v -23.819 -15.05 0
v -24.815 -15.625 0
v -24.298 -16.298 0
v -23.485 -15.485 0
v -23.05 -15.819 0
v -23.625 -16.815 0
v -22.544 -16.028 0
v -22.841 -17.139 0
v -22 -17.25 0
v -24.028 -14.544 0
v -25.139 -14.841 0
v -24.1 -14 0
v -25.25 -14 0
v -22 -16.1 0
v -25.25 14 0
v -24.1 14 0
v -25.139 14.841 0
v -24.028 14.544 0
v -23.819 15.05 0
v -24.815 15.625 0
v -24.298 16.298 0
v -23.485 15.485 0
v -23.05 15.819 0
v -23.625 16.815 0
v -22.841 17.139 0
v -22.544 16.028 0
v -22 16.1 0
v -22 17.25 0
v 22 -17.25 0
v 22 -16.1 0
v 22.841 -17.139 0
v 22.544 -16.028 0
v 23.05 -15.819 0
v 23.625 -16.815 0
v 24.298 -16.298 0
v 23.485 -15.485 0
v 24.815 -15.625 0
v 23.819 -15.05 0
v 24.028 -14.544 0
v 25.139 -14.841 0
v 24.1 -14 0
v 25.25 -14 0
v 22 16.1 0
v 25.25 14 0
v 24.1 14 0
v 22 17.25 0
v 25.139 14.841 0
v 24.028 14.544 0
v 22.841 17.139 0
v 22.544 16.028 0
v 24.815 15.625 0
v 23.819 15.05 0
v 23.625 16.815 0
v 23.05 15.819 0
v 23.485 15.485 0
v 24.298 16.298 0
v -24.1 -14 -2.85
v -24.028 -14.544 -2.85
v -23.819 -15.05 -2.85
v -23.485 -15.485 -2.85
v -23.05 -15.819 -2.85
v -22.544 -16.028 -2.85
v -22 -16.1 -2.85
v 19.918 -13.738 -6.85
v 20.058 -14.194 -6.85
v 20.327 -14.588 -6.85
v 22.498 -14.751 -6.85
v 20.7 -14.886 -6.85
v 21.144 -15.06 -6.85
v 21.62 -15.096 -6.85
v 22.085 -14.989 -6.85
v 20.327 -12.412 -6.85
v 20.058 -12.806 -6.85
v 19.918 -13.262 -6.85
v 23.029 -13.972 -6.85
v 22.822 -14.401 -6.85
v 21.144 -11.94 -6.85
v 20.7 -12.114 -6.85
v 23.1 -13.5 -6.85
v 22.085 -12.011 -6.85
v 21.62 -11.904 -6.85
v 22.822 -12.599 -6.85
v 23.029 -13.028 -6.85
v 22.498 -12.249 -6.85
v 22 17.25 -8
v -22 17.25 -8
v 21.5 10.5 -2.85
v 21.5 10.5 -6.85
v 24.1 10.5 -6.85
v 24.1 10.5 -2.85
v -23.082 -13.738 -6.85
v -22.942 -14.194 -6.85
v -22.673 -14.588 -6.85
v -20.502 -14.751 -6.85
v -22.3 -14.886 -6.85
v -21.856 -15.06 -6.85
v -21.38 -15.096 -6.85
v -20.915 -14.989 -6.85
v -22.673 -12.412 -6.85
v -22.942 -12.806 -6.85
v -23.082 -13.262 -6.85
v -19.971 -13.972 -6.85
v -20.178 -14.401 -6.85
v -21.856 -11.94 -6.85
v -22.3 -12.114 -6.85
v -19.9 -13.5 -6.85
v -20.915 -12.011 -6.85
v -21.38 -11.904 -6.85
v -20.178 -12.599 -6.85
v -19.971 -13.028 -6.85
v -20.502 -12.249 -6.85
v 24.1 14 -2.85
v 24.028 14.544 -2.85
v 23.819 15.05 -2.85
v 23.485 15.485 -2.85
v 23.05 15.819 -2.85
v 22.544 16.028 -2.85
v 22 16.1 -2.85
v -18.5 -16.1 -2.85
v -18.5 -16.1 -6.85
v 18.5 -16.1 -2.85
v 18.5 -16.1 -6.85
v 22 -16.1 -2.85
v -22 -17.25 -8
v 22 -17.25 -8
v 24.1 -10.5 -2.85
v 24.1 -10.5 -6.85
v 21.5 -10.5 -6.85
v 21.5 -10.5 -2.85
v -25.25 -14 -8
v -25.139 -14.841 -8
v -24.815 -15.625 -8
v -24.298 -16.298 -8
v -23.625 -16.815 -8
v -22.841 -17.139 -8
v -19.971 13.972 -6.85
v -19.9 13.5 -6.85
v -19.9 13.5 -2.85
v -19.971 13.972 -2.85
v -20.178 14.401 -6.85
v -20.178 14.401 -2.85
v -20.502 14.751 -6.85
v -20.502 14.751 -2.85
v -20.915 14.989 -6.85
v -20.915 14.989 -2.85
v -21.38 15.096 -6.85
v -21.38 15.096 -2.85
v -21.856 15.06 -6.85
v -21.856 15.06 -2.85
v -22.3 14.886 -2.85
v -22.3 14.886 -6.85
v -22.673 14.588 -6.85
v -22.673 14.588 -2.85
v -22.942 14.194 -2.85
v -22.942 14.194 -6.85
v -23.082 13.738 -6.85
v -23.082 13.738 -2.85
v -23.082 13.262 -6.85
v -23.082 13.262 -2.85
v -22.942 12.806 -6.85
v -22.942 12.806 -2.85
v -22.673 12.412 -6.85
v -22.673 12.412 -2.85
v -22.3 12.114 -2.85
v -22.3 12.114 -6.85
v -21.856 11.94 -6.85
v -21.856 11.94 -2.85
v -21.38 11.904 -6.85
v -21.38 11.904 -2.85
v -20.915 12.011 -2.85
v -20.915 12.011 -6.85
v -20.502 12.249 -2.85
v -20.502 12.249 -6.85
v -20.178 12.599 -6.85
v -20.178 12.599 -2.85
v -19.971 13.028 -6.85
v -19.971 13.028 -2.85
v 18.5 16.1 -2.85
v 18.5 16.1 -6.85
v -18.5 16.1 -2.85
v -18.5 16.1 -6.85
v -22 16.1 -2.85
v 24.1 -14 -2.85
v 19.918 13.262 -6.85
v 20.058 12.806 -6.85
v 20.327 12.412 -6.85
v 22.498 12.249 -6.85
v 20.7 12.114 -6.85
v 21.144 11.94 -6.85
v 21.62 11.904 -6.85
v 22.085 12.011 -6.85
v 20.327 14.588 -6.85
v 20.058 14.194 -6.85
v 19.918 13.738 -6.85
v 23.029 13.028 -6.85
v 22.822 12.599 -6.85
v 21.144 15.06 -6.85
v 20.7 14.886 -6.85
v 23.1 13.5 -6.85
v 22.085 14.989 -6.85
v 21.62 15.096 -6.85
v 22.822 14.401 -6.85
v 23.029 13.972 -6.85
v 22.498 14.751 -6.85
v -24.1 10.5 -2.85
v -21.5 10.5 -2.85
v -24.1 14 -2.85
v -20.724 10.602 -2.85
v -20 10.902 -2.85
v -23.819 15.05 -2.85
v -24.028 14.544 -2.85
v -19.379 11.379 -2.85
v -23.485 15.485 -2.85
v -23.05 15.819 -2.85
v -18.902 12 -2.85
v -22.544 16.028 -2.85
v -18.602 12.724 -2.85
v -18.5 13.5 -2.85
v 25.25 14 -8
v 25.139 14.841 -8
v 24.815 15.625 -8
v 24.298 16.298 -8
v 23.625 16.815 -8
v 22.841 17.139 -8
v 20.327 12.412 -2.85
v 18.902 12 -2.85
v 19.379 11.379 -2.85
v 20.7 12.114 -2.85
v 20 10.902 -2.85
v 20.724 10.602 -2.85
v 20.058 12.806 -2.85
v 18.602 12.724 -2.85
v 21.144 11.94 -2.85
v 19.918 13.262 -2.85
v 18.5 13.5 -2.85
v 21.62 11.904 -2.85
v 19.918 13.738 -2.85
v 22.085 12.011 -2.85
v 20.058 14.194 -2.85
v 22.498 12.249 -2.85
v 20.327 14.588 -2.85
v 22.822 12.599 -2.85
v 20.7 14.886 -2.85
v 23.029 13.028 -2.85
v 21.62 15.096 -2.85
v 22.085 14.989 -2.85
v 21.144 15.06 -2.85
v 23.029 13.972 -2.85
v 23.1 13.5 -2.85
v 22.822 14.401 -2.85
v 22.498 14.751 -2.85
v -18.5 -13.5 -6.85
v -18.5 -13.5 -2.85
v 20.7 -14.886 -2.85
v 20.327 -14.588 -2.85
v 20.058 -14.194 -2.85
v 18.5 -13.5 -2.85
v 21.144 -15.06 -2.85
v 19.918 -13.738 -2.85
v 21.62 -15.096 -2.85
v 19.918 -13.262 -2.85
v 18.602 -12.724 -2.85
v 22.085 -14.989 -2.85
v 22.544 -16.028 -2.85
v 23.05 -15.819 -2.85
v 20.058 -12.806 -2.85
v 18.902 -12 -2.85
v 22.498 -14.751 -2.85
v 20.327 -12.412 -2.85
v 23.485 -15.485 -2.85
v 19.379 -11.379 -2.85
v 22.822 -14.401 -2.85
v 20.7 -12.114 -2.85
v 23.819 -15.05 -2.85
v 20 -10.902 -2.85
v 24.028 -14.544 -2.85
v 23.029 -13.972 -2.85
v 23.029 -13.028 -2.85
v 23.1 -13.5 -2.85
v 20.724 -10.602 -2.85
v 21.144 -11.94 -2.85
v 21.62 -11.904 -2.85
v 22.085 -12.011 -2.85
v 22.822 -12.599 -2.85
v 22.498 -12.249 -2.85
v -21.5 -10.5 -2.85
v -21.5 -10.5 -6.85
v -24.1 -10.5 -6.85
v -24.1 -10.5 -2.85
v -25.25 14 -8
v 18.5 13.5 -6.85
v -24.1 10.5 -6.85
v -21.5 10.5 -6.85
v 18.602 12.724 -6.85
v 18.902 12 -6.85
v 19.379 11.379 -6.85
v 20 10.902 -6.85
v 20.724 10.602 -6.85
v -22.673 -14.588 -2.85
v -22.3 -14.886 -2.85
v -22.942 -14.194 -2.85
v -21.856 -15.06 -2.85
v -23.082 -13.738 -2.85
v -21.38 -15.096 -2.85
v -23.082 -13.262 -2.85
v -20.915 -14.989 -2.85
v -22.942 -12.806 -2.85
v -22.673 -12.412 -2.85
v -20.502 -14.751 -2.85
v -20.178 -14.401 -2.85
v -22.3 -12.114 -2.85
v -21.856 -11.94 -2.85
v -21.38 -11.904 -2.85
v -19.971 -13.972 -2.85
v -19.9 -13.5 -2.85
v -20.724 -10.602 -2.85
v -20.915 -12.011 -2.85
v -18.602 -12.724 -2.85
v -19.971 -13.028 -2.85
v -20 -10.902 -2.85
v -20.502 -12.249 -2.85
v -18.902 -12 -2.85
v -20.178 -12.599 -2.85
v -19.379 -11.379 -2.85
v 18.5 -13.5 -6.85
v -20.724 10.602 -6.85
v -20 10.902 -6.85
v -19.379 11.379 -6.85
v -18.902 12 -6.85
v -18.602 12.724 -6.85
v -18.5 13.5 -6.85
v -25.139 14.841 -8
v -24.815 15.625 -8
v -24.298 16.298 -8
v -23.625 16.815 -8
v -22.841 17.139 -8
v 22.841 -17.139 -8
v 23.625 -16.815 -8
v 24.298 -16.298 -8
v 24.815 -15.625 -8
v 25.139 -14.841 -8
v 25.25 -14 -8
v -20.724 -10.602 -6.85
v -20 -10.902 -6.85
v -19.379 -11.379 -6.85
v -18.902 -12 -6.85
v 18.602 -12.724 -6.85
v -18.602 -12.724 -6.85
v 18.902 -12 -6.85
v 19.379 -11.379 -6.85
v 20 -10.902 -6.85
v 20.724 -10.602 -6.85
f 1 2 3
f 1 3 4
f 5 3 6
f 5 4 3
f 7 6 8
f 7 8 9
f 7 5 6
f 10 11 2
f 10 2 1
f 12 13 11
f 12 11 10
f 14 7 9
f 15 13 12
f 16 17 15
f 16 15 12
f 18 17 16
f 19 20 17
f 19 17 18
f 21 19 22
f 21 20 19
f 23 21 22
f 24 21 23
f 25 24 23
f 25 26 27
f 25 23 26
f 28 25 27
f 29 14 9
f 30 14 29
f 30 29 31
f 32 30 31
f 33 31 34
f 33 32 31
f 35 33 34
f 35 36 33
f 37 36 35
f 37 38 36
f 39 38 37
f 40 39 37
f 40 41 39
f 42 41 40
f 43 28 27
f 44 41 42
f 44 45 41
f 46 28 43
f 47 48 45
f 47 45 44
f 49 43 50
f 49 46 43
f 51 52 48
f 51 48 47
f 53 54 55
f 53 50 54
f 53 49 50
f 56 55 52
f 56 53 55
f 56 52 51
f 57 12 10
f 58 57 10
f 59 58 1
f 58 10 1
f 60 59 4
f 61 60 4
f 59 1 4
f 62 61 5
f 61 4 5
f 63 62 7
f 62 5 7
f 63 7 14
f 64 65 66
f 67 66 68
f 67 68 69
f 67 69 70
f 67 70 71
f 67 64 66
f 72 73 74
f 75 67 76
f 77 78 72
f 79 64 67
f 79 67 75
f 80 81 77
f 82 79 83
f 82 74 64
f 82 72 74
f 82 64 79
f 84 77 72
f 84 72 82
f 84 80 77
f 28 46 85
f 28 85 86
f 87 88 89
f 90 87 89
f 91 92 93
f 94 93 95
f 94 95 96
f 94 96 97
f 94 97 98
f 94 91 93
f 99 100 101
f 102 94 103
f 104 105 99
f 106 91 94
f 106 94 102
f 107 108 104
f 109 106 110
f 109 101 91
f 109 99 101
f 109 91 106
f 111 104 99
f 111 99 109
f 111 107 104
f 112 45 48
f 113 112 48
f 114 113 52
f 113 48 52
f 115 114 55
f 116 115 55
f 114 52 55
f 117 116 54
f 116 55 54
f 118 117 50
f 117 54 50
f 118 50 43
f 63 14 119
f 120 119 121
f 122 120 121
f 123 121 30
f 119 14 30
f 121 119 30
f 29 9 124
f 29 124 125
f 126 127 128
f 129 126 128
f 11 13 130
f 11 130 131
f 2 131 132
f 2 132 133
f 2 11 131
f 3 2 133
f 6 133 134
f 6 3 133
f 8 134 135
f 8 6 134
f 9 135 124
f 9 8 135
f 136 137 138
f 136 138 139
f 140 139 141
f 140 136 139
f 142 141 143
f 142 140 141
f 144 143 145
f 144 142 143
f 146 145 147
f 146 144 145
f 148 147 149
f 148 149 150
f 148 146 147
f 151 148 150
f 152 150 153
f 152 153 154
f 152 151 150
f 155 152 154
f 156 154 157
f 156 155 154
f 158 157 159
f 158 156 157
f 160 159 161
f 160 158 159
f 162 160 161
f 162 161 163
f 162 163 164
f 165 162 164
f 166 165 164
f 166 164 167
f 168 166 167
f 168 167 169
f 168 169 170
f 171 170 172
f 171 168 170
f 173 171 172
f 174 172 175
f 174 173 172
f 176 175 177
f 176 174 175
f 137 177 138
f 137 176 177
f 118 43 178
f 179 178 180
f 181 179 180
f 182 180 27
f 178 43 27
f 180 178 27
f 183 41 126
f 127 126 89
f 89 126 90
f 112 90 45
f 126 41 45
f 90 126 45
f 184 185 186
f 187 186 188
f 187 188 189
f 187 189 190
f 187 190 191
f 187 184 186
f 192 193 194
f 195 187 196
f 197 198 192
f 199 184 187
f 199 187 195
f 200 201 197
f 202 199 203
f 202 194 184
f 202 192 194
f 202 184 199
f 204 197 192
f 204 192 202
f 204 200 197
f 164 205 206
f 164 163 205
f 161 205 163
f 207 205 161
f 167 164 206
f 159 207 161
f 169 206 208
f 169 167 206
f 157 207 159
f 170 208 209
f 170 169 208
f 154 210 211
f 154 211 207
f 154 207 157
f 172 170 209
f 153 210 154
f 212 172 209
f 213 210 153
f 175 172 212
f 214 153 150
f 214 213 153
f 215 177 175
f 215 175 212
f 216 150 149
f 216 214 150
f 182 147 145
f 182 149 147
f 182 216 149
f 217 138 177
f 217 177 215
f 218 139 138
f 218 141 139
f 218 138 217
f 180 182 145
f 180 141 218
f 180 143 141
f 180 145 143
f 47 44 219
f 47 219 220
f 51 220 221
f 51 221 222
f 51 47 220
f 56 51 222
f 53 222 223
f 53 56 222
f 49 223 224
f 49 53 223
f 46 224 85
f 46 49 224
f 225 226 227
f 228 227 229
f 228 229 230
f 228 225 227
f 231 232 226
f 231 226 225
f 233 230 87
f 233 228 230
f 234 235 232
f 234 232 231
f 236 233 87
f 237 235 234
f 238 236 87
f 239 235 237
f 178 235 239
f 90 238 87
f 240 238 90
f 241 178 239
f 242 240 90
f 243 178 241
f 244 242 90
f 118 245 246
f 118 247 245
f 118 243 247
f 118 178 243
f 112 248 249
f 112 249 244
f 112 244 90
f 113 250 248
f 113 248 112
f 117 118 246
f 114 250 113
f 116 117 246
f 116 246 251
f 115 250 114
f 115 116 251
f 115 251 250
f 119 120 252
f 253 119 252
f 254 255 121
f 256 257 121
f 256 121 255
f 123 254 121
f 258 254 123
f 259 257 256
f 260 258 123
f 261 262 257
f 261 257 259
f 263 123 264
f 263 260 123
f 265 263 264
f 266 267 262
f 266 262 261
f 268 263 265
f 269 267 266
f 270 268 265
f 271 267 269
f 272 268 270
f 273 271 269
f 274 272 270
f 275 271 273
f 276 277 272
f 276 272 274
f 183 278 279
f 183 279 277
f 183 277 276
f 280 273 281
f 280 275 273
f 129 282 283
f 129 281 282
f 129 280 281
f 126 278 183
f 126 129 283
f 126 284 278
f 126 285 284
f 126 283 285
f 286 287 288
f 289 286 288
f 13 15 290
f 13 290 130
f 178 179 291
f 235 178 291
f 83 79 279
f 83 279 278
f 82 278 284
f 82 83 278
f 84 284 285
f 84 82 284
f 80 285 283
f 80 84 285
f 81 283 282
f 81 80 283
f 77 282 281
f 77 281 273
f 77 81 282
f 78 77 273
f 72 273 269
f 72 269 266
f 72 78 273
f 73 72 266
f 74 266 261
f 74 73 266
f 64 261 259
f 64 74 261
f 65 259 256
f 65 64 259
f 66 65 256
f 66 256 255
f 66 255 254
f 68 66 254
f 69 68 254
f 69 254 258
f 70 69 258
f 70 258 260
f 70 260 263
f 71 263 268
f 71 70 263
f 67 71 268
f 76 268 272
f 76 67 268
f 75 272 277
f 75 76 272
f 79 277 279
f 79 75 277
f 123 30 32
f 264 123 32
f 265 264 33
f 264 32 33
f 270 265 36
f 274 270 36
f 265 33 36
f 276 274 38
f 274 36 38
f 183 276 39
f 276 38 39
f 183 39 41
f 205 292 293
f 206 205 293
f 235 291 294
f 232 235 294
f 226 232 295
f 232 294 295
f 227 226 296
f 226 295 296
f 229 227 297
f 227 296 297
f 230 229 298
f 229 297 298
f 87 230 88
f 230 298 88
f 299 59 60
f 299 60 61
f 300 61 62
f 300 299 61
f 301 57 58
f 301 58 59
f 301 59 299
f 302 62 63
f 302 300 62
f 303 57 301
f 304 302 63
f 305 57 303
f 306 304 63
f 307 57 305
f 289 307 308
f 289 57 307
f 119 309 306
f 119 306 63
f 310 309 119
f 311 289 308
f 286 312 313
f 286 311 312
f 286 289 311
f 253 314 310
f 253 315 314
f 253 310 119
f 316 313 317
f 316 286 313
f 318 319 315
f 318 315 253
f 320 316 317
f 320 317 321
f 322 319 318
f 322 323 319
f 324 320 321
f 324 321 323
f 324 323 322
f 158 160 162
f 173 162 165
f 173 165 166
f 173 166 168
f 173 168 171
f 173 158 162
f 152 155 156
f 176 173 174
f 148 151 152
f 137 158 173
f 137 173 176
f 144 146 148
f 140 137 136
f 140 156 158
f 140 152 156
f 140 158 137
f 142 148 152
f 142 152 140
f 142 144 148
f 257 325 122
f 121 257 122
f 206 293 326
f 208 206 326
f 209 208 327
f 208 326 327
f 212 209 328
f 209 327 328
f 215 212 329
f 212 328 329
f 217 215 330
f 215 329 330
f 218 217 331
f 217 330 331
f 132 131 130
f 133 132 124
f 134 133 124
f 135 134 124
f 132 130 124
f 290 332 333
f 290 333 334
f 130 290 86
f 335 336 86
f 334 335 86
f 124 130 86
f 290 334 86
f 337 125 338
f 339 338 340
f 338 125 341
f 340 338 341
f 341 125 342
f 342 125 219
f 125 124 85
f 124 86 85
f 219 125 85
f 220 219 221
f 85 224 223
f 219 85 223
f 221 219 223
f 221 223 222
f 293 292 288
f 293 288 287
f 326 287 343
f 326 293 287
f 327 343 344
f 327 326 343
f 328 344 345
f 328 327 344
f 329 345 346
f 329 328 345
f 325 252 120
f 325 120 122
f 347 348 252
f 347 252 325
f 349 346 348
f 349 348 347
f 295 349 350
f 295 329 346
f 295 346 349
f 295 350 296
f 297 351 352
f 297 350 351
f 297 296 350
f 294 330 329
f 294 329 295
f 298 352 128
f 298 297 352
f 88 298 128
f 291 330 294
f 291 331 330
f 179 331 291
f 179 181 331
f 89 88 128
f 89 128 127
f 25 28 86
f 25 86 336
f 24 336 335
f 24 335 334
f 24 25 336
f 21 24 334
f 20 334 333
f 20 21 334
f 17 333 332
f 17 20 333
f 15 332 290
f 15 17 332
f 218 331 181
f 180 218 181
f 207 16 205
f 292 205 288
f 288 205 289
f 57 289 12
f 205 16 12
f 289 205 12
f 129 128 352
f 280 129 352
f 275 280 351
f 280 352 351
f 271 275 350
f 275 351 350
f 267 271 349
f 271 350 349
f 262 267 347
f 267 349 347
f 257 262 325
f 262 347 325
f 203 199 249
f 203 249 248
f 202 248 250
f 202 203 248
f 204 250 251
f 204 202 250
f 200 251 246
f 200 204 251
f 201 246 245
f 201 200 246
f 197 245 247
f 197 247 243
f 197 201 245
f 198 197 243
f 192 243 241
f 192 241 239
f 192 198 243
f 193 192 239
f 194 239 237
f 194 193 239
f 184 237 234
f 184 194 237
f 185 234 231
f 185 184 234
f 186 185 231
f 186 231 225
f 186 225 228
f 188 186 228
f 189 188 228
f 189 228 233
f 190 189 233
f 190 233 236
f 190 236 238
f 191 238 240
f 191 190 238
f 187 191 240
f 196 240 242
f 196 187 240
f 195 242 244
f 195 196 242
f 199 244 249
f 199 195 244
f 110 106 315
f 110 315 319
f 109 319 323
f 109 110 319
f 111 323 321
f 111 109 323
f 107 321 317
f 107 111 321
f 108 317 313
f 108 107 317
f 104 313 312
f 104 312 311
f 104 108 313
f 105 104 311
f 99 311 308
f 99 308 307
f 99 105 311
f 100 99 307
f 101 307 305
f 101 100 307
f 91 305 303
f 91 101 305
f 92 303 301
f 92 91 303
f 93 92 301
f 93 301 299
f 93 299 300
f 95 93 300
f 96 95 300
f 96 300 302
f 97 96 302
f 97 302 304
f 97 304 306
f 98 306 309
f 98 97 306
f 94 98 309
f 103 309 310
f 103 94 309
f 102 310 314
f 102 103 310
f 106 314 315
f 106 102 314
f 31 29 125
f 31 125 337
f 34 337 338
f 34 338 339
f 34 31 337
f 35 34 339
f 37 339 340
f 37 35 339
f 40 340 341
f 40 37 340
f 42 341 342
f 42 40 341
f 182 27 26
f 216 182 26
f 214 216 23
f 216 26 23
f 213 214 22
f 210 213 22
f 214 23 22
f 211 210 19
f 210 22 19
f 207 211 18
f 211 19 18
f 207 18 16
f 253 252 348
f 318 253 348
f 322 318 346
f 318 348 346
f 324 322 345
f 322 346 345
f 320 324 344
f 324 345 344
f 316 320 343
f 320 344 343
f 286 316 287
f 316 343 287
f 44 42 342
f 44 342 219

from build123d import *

# Parameters (mm, degrees)
PAD_DEPTH    = 8
THICKNESS_T  = -1.15
SKETCH002_R  = 1.6
PAD008_DEPTH = 4


with BuildPart() as part:
    # Sketch001 → Pad (new body)
    with BuildSketch(Plane.XY):
        with BuildLine():
            Line((-25.25, 14), (-25.25, -14))
            ThreePointArc((-25.25, -14), (-24.298097, -16.298097), (-22, -17.25))
            Line((-22, -17.25), (22, -17.25))
            ThreePointArc((22, -17.25), (24.298097, -16.298097), (25.25, -14))
            Line((25.25, -14), (25.25, 14))
            ThreePointArc((25.25, 14), (24.298097, 16.298097), (22, 17.25))
            Line((22, 17.25), (-22, 17.25))
            ThreePointArc((-22, 17.25), (-24.298097, 16.298097), (-25.25, 14))
        make_face()
    extrude(amount=-PAD_DEPTH)

    # Thickness
    thickness_openings = [part.faces().sort_by_distance(p)[0] for p in [
        (0, 0, 0),
    ]]
    offset(amount=THICKNESS_T, openings=thickness_openings)

    # Sketch002 (on Face19 of Thickness) → Pad008 (join)
    with BuildSketch(Plane.XY.offset(-6.85)):
        with BuildLine():
            Line((-24.1, 14), (-24.1, 10.5))
            Line((-24.1, 10.5), (-21.5, 10.5))
            ThreePointArc((-21.5, 10.5), (-19.37868, 11.37868), (-18.5, 13.5))
            Line((-18.5, 13.5), (-18.5, 16.1))
            Line((-18.5, 16.1), (-22, 16.1))
            ThreePointArc((-22, 16.1), (-23.484924, 15.484924), (-24.1, 14))
        make_face()
        with Locations((-21.5, 13.5)):
            Circle(SKETCH002_R, mode=Mode.SUBTRACT)
        with BuildLine():
            Line((18.5, 16.1), (18.5, 13.5))
            ThreePointArc((18.5, 13.5), (19.37868, 11.37868), (21.5, 10.5))
            Line((21.5, 10.5), (24.1, 10.5))
            Line((24.1, 10.5), (24.1, 14))
            ThreePointArc((24.1, 14), (23.484924, 15.484924), (22, 16.1))
            Line((22, 16.1), (18.5, 16.1))
        make_face()
        with Locations((21.5, 13.5)):
            Circle(SKETCH002_R, mode=Mode.SUBTRACT)
        with BuildLine():
            Line((-21.5, -10.5), (-24.1, -10.5))
            Line((-24.1, -10.5), (-24.1, -14))
            ThreePointArc((-24.1, -14), (-23.484924, -15.484924), (-22, -16.1))
            Line((-22, -16.1), (-18.5, -16.1))
            Line((-18.5, -16.1), (-18.5, -13.5))
            ThreePointArc((-18.5, -13.5), (-19.37868, -11.37868), (-21.5, -10.5))
        make_face()
        with Locations((-21.5, -13.5)):
            Circle(SKETCH002_R, mode=Mode.SUBTRACT)
        with BuildLine():
            Line((18.5, -13.5), (18.5, -16.1))
            Line((18.5, -16.1), (22, -16.1))
            ThreePointArc((22, -16.1), (23.484924, -15.484924), (24.1, -14))
            Line((24.1, -14), (24.1, -10.5))
            Line((24.1, -10.5), (21.5, -10.5))
            ThreePointArc((21.5, -10.5), (19.37868, -11.37868), (18.5, -13.5))
        make_face()
        with Locations((21.5, -13.5)):
            Circle(SKETCH002_R, mode=Mode.SUBTRACT)
    extrude(amount=PAD008_DEPTH)


solid = part.part
